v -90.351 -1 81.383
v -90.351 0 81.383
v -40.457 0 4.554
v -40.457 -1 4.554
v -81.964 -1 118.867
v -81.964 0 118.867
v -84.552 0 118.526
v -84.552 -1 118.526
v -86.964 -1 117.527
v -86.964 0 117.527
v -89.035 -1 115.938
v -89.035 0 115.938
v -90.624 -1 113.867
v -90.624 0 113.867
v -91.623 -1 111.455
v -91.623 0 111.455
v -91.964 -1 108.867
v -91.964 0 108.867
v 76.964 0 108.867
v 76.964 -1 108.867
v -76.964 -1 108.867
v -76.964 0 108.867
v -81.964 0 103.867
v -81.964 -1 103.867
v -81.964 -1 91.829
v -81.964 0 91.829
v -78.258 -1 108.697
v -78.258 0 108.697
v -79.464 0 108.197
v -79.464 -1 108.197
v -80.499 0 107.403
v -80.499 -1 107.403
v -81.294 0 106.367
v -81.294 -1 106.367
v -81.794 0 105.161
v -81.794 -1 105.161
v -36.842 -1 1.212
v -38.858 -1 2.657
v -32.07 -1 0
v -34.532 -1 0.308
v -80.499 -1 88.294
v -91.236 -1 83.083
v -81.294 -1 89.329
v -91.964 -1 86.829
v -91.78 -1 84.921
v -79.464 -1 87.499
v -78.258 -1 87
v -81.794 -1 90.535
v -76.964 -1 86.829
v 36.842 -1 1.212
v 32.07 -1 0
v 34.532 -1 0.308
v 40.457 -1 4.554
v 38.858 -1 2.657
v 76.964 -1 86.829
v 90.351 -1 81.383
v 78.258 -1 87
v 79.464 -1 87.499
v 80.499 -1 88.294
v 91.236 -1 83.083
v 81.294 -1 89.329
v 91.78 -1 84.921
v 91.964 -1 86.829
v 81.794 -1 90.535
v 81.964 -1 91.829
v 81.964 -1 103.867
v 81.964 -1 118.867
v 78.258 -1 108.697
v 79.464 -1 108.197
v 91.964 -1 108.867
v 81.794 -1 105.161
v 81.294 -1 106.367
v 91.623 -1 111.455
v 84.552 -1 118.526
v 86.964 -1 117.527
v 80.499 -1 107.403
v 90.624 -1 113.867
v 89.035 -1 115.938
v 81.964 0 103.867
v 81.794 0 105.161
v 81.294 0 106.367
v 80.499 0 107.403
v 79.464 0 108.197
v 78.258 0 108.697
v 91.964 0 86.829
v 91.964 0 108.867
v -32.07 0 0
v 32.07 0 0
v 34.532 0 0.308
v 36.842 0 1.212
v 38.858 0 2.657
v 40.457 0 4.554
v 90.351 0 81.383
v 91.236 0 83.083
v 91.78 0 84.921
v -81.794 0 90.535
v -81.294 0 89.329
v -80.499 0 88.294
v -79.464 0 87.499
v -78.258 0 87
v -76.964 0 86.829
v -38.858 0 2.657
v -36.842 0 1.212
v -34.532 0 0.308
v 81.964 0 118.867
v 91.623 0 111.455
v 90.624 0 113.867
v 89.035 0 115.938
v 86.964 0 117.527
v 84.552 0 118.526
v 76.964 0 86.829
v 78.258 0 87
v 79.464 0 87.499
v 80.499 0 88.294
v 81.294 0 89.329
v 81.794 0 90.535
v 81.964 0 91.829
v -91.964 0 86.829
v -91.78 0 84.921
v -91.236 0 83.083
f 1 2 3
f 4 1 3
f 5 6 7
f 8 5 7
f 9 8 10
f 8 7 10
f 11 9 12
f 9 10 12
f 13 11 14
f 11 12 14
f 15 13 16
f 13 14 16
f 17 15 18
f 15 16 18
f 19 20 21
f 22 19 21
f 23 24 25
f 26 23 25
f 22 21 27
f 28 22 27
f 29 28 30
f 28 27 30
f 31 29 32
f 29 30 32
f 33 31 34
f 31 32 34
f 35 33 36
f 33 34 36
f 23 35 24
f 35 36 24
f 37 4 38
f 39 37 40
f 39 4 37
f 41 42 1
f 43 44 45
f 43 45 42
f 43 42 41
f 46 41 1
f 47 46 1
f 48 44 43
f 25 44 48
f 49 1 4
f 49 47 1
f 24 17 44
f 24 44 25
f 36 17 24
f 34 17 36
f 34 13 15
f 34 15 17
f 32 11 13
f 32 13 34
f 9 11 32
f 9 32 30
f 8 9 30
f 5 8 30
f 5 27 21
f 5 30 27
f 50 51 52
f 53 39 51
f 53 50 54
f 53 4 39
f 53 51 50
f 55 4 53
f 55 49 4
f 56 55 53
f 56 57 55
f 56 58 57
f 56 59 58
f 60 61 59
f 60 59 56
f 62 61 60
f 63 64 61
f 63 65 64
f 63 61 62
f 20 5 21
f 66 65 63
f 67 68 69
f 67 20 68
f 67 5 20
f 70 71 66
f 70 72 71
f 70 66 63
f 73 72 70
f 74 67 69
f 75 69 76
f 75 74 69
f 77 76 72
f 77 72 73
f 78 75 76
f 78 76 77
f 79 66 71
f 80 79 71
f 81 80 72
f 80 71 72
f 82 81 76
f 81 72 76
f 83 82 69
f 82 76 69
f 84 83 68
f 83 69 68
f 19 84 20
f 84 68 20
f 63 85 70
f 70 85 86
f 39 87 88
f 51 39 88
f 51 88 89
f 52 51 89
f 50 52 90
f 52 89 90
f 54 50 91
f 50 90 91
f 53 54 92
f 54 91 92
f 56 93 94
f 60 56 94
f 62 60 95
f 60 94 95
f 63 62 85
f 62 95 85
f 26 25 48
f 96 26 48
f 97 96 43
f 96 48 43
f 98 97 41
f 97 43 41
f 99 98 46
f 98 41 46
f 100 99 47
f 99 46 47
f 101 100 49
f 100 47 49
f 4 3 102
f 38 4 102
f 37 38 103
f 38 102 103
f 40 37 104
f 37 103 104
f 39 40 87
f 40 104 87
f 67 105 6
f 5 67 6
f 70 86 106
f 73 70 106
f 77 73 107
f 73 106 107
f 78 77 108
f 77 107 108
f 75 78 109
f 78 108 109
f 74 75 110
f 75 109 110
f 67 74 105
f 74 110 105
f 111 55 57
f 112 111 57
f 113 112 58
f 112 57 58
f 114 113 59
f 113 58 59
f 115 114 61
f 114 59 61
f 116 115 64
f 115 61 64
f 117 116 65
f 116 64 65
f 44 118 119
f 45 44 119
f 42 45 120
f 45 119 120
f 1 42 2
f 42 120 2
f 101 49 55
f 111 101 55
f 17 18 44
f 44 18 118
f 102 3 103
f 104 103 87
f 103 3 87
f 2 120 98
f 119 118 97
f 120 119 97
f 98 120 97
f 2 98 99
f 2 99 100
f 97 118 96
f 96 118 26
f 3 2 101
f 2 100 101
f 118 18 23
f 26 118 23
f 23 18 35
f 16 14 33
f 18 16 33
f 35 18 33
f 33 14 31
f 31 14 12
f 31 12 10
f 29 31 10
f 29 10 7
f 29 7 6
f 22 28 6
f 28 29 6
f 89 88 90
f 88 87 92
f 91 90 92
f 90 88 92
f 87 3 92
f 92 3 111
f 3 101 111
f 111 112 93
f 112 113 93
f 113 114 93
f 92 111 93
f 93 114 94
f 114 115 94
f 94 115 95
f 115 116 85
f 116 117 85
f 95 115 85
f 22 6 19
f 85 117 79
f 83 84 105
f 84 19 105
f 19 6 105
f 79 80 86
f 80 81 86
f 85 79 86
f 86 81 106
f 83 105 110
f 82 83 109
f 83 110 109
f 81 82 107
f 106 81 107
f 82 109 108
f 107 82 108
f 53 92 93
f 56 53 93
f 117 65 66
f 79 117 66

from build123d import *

# Parameters (mm, degrees)
F1_DEPTH = 1
F4_DEPTH = 25


with BuildPart() as f1:
    # F0 (on Front) → F1 (new body)
    with BuildSketch(Plane.XZ):
        with BuildLine():
            Line((-32.070443, 0), (0, 0))
            Line((0, 0), (32.070443, 0))
            ThreePointArc((32.070443, 0), (36.842031, 1.211829), (40.457149, 4.55361))
            Line((40.457149, 4.55361), (90.350609, 81.382801))
            ThreePointArc((90.350609, 81.382801), (91.552101, 83.989038), (91.963904, 86.829192))
            Line((91.963904, 86.829192), (91.963904, 108.867057))
            ThreePointArc((91.963904, 108.867057), (89.034971, 115.938125), (81.963904, 118.867057))
            Line((81.963904, 118.867057), (-81.963904, 118.867057))
            ThreePointArc((-81.963904, 118.867057), (-89.034971, 115.938125), (-91.963904, 108.867057))
            Line((-91.963904, 108.867057), (-91.963904, 86.829192))
            ThreePointArc((-91.963904, 86.829192), (-91.552101, 83.989038), (-90.350609, 81.382801))
            Line((-90.350609, 81.382801), (-40.457149, 4.55361))
            ThreePointArc((-40.457149, 4.55361), (-36.842031, 1.211829), (-32.070443, 0))
        make_face()
    extrude(amount=F1_DEPTH)


with BuildPart() as f2_1:
    # F2: copy of F1
    add(f1.part)


with BuildPart() as f4_tool:
    # F3 (on face) → F4 (new body)
    with BuildSketch(Plane.XZ.offset(1)):
        with BuildLine():
            Line((76.963904, 108.867057), (-76.963904, 108.867057))
            ThreePointArc((-76.963904, 108.867057), (-80.499437, 107.402591), (-81.963904, 103.867057))
            Line((-81.963904, 103.867057), (-81.963904, 91.829192))
            ThreePointArc((-81.963904, 91.829192), (-80.499437, 88.293658), (-76.963904, 86.829192))
            Line((-76.963904, 86.829192), (76.963904, 86.829192))
            ThreePointArc((76.963904, 86.829192), (80.499437, 88.293658), (81.963904, 91.829192))
            Line((81.963904, 91.829192), (81.963904, 103.867057))
            ThreePointArc((81.963904, 103.867057), (80.499437, 107.402591), (76.963904, 108.867057))
        make_face()
    extrude(amount=-F4_DEPTH)


with BuildPart() as f1_1:
    add(f1.part)

    # F4: cut by f4_tool
    add(f4_tool.part, mode=Mode.SUBTRACT)


with BuildPart() as f2_1_1:
    add(f2_1.part)

    # F4: cut by f4_tool
    add(f4_tool.part, mode=Mode.SUBTRACT)


solid = f1_1.part
